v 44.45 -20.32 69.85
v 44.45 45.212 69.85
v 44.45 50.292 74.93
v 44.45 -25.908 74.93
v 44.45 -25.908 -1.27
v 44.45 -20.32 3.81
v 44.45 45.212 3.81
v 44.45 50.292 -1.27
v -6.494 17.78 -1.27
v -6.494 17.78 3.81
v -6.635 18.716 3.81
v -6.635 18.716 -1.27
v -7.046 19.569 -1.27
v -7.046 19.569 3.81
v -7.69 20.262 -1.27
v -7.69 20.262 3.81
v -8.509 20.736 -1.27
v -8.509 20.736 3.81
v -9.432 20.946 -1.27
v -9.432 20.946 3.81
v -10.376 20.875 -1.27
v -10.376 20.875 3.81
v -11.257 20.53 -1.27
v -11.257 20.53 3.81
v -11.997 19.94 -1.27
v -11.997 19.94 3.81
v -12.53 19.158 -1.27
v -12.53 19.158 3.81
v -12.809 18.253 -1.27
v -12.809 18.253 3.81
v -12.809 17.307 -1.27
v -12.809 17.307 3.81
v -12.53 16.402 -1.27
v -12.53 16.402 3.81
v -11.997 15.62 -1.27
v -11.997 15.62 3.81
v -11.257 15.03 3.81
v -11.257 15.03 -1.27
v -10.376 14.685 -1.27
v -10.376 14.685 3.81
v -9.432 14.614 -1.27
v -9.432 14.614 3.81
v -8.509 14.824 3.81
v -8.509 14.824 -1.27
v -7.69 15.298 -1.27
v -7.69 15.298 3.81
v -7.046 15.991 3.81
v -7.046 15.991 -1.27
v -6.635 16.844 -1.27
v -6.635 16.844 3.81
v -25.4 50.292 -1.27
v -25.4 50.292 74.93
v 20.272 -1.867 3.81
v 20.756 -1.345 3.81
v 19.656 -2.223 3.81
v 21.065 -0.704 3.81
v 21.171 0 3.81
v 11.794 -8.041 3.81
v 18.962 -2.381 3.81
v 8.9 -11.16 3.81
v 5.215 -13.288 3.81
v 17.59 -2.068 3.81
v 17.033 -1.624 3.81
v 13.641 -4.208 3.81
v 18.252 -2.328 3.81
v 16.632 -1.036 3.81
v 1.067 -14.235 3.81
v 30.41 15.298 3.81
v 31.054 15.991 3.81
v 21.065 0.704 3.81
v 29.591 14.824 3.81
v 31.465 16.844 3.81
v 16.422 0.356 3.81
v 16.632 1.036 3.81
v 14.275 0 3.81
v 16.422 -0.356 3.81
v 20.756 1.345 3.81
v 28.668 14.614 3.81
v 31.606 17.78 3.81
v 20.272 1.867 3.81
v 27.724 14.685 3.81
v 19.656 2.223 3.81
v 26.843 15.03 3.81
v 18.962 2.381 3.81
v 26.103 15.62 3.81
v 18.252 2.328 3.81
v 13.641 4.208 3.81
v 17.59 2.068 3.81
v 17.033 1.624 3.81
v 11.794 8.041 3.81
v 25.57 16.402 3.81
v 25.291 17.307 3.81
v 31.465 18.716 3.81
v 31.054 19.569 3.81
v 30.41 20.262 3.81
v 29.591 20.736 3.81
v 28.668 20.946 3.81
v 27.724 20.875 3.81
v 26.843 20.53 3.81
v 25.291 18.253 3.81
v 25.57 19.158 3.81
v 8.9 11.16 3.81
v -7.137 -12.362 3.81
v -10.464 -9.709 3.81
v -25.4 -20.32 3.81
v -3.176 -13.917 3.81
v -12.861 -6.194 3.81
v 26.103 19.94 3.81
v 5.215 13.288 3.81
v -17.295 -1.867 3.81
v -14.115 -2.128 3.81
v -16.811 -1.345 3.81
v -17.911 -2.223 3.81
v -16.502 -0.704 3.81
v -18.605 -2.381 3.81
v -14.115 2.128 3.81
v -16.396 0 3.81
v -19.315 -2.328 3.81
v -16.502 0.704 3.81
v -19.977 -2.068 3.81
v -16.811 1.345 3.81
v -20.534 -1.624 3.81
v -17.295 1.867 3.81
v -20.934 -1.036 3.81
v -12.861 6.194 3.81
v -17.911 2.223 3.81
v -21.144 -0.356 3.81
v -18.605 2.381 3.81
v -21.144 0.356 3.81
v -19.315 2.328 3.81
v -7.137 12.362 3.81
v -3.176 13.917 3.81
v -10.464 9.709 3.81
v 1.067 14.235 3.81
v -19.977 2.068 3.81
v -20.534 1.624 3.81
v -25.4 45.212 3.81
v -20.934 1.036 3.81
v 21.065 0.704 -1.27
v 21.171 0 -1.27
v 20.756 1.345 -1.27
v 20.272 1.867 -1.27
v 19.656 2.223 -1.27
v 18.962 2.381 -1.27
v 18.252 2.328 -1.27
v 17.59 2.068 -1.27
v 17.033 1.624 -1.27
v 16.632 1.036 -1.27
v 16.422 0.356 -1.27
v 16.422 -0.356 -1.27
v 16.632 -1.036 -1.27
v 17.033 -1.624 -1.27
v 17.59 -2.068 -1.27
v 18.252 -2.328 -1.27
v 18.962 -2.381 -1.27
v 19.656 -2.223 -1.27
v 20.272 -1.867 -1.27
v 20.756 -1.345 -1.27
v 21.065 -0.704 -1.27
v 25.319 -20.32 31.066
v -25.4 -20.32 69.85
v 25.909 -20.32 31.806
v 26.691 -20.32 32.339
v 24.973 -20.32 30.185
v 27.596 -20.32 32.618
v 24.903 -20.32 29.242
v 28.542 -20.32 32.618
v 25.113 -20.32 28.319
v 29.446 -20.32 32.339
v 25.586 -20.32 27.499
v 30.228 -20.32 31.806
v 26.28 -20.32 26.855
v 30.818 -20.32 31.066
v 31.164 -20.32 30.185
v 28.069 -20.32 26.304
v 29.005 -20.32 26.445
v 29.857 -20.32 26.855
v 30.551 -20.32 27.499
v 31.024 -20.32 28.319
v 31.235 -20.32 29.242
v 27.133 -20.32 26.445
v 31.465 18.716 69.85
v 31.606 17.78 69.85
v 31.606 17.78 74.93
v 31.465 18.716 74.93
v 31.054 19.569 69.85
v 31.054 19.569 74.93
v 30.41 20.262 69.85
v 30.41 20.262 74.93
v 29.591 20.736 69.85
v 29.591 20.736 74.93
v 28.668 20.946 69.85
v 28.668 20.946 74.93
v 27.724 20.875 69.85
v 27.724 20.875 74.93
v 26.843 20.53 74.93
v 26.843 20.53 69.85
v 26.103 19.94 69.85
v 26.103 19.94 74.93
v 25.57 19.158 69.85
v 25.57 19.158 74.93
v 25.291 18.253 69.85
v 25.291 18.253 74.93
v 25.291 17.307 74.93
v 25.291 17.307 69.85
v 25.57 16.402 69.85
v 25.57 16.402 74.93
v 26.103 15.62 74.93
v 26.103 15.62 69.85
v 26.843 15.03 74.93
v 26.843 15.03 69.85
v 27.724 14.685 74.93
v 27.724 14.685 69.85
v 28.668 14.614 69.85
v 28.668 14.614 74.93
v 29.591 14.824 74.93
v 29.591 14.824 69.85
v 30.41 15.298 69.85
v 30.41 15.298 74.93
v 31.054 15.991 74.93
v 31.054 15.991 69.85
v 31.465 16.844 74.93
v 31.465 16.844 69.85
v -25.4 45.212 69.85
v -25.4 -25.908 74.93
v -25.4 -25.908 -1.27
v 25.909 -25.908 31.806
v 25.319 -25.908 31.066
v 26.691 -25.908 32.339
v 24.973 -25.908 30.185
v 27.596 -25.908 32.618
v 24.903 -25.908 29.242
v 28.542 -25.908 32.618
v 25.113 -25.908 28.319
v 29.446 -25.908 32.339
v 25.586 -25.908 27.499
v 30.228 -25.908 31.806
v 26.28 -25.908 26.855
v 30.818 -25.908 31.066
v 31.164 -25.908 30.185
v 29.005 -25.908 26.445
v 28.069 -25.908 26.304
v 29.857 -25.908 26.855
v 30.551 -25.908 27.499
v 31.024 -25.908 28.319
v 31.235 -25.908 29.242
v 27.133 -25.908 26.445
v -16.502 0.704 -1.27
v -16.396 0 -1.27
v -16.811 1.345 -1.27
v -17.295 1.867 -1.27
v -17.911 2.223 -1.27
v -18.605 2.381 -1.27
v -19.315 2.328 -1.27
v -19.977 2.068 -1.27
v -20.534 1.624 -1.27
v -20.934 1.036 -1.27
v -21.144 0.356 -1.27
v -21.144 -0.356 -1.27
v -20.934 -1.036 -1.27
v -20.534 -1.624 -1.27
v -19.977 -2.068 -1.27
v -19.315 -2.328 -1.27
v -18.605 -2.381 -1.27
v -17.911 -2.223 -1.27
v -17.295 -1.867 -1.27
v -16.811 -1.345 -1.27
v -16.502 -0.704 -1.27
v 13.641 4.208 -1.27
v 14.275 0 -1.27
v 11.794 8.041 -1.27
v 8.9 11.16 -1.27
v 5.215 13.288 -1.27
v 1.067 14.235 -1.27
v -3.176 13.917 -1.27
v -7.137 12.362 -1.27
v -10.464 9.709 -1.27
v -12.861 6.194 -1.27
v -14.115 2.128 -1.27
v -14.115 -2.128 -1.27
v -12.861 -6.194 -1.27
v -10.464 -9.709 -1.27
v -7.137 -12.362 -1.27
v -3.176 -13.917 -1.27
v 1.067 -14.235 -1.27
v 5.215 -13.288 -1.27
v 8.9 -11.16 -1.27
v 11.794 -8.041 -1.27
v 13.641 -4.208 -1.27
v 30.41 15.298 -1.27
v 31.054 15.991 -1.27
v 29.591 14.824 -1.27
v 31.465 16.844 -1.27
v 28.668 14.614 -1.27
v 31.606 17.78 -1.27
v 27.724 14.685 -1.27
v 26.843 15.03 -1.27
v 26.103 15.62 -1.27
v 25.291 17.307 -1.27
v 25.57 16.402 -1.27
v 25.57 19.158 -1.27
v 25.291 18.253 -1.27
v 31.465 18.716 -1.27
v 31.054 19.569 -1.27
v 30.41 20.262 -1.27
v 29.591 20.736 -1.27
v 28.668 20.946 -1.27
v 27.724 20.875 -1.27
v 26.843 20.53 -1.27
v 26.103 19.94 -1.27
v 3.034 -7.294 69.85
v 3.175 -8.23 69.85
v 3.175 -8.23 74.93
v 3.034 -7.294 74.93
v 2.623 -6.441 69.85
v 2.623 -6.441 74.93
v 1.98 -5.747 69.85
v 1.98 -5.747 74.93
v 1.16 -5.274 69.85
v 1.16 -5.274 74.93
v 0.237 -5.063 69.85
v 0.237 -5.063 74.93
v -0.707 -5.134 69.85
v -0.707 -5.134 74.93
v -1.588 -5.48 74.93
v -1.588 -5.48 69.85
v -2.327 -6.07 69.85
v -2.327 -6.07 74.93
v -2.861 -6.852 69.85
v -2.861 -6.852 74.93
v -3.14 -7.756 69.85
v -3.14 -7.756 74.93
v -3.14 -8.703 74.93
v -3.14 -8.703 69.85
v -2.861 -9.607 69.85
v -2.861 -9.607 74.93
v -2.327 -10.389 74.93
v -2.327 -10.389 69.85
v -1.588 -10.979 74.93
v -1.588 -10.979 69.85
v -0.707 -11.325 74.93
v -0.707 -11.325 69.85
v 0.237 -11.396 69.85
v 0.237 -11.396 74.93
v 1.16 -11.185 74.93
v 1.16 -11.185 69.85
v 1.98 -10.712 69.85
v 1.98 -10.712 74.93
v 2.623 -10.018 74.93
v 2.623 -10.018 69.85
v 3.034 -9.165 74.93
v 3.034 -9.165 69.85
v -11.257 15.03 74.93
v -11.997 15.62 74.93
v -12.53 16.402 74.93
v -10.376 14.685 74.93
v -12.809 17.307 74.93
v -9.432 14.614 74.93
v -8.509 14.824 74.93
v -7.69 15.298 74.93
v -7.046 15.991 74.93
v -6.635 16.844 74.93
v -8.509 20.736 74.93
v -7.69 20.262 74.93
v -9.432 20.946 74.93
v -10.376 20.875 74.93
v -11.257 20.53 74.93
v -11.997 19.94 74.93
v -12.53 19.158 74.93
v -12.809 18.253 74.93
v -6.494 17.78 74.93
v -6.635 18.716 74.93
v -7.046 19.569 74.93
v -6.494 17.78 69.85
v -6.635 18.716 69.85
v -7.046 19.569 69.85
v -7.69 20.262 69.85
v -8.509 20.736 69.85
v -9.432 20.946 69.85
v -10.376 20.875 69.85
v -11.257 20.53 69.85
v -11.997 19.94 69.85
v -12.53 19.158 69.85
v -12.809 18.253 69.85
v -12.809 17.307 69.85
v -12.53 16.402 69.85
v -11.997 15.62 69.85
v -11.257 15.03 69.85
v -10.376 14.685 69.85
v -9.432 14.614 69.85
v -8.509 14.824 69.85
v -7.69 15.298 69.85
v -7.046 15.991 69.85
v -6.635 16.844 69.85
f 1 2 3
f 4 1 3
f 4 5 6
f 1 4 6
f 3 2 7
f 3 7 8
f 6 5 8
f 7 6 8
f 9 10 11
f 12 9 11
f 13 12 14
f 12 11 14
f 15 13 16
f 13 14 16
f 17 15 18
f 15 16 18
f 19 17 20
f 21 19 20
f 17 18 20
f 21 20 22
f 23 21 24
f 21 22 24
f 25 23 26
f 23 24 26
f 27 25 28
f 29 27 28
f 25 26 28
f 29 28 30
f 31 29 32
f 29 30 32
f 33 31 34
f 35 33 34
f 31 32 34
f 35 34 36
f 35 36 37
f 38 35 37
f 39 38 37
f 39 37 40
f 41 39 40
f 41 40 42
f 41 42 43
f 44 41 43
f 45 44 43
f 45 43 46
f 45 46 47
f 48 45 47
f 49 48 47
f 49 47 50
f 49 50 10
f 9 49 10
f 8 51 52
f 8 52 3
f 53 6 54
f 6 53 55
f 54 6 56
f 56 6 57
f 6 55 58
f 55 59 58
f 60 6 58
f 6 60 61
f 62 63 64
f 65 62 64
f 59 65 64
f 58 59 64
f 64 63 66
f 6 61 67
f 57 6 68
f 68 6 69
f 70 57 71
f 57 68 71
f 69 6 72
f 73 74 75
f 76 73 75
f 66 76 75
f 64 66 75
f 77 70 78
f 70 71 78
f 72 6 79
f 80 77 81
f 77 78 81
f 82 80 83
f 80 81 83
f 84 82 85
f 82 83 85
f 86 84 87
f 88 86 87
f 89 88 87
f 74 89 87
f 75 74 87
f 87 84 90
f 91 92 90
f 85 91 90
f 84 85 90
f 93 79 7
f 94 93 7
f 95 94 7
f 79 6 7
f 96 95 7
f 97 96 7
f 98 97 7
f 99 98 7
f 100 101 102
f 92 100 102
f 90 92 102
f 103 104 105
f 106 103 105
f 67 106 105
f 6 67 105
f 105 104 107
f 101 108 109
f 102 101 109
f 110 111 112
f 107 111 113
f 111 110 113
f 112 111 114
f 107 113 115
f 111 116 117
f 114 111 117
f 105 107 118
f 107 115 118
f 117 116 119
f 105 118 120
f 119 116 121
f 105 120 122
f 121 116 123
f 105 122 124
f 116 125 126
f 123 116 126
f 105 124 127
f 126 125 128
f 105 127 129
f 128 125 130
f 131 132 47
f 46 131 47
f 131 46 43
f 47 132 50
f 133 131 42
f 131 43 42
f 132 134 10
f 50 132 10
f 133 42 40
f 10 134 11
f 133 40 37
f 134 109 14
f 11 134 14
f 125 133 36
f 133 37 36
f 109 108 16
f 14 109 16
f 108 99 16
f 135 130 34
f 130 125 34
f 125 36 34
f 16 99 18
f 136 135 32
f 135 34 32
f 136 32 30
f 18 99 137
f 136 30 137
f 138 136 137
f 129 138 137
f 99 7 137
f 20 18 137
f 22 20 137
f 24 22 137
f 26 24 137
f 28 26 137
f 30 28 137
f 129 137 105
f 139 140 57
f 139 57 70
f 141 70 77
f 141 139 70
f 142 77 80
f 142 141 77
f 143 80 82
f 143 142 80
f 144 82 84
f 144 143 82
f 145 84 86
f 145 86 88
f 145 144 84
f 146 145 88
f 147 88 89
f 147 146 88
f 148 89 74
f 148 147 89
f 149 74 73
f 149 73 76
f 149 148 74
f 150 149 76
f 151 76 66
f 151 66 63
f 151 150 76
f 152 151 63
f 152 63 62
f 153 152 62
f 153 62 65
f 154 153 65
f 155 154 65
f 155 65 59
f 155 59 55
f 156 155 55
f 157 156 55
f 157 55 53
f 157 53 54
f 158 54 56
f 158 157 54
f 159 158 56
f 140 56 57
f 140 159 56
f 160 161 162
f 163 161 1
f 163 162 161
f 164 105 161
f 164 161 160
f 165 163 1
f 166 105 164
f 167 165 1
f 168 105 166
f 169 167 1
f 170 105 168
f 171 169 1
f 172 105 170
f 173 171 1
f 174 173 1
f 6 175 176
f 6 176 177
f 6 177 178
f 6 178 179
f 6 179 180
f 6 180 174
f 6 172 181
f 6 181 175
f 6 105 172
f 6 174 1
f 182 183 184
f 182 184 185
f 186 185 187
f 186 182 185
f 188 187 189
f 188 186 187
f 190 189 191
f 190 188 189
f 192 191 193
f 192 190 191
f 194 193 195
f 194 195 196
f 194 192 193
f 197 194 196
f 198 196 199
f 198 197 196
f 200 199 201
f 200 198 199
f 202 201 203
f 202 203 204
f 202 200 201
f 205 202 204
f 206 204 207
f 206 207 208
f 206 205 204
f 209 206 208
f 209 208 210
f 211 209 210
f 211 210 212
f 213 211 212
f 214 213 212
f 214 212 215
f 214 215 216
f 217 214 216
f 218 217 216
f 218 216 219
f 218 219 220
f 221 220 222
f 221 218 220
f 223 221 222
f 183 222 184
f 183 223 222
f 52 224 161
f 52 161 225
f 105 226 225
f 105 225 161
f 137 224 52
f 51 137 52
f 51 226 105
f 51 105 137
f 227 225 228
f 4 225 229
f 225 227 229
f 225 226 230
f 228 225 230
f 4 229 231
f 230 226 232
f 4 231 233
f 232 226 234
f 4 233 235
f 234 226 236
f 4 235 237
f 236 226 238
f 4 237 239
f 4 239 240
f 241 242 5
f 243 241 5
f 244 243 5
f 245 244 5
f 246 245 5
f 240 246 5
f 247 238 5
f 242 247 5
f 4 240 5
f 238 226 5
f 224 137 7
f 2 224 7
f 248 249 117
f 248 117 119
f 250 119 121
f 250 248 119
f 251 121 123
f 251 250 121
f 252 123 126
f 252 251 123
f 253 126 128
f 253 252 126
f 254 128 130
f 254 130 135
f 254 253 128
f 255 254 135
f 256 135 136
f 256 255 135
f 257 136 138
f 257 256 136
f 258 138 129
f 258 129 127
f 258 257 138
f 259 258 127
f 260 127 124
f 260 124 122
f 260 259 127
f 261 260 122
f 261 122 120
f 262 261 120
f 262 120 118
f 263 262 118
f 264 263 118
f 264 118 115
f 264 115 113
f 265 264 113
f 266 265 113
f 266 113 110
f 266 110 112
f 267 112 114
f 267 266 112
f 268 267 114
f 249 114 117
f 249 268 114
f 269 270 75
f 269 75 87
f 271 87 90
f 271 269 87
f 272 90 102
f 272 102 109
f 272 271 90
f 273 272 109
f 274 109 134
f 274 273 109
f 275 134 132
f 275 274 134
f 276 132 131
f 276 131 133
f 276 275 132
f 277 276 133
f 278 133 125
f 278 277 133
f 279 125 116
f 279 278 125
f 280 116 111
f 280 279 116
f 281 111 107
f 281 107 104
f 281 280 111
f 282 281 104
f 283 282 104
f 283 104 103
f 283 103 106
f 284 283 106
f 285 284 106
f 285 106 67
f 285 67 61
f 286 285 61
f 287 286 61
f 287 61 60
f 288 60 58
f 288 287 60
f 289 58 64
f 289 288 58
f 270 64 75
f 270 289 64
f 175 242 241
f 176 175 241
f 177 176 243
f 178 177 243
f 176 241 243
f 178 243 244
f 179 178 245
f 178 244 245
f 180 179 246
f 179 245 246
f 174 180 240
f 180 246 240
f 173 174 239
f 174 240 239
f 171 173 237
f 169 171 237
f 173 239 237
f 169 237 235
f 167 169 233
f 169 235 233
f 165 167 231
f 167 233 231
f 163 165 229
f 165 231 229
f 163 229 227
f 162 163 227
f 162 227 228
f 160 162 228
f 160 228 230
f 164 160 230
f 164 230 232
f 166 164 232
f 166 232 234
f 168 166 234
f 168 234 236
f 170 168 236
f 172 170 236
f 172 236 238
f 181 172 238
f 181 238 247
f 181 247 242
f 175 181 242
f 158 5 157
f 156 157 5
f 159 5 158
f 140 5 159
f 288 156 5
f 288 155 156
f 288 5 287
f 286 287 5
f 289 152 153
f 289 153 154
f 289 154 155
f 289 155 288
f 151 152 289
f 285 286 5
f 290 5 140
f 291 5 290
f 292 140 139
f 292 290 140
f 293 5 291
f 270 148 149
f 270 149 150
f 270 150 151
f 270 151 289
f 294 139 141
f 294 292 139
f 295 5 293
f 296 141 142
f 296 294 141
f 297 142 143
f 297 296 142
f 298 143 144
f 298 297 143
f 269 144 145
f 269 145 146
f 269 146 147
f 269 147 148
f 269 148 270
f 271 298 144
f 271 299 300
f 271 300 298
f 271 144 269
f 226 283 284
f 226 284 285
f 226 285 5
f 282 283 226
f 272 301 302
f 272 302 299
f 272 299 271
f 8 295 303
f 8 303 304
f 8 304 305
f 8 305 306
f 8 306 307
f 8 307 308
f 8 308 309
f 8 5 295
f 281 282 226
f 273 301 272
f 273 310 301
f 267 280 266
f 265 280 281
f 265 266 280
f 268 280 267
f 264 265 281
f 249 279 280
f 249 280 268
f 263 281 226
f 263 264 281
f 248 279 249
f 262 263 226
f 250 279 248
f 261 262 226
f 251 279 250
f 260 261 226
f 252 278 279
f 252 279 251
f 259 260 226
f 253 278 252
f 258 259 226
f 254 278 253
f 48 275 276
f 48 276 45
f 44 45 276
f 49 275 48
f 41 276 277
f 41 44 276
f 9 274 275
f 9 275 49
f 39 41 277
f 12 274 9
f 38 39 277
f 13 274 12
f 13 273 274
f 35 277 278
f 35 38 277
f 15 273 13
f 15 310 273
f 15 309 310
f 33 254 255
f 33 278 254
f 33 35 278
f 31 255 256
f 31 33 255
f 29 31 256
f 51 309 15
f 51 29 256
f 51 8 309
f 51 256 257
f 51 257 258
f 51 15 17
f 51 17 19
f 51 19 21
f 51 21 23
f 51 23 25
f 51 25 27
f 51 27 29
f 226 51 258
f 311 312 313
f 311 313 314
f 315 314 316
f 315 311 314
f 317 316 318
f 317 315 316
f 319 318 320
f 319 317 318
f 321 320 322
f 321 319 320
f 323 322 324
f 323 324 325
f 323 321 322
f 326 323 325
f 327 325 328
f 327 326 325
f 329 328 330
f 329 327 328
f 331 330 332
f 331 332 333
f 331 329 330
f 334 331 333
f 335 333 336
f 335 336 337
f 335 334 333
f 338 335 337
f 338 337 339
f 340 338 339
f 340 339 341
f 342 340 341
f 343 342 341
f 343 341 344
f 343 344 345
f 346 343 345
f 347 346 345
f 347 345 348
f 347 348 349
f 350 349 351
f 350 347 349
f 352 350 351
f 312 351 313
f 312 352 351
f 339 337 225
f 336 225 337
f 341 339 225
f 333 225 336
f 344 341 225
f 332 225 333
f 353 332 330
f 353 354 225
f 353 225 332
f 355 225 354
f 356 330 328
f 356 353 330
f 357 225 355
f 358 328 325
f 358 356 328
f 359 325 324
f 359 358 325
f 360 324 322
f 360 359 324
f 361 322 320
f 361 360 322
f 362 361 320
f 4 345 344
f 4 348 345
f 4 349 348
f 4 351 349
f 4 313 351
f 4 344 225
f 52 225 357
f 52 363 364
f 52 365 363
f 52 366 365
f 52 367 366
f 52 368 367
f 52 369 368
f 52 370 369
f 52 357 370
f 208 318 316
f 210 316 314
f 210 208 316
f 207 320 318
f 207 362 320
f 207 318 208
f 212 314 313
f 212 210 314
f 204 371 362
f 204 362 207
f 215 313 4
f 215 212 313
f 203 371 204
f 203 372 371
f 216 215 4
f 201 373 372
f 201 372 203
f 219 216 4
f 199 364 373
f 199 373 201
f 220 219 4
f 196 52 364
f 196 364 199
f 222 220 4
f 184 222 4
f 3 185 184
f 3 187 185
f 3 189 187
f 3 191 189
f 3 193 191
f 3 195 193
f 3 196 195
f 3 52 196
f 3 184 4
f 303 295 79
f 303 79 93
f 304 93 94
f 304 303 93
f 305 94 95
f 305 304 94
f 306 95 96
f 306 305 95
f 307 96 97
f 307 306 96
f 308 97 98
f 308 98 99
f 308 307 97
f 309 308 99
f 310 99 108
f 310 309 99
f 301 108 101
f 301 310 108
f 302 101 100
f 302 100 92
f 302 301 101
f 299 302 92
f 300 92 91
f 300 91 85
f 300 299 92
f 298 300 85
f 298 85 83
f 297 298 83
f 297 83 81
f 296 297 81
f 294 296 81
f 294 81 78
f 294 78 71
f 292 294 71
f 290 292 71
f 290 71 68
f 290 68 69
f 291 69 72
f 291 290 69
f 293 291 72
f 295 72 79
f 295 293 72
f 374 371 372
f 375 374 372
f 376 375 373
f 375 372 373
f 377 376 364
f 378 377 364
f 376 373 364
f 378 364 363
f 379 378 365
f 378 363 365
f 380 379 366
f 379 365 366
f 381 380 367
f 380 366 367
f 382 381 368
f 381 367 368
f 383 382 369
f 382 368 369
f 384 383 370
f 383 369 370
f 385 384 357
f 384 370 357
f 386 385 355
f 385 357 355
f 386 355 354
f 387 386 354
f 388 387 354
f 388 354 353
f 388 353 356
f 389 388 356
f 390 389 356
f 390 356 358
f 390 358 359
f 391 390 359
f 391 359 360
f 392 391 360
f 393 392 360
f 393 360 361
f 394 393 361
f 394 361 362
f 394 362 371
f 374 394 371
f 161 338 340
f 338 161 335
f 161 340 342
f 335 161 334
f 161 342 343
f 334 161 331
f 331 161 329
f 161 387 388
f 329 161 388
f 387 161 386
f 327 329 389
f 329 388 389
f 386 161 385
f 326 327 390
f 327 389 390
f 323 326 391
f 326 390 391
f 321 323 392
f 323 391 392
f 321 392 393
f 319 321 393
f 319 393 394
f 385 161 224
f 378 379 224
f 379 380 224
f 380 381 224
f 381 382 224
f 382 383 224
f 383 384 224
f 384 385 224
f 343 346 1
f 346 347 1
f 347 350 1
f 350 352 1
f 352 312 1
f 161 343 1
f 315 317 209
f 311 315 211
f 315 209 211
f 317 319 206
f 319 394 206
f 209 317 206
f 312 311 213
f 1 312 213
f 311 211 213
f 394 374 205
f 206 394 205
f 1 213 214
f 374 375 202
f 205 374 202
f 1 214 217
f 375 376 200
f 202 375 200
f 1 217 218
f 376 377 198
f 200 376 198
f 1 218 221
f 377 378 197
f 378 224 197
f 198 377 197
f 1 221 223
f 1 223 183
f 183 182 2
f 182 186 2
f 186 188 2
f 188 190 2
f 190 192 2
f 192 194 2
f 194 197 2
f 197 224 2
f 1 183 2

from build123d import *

# Parameters (mm, degrees)
BOSS_EXTRUDE1_DEPTH      = 3.81
BOSS_EXTRUDE1_DEPTH_BACK = 1.27
SKETCH1_R                = 14.2748
SKETCH1_R_2              = 2.3876
SKETCH1_R_3              = 3.175
SKETCH2_W                = 69.85
SKETCH2_H                = 5.08
BOSS_EXTRUDE2_DEPTH      = 66.04
SKETCH3_W                = 69.85
SKETCH3_H                = 5.588
BOSS_EXTRUDE3_DEPTH      = 66.04
SKETCH4_W                = 69.85
SKETCH4_H                = 76.2
SKETCH4_R                = 3.175
BOSS_EXTRUDE4_DEPTH      = 5.08
CUT_EXTRUDE1_REACH       = 117.744
SKETCH6_R                = 3.174999999
SKETCH8_R                = 3.175
CUT_EXTRUDE2_DEPTH       = 102.545692986


with BuildPart() as part:
    # Sketch1 → Boss-Extrude1 (new, two sides: drawn at the far end of the back side and taken through both)
    with BuildSketch(Plane.XY.offset(-BOSS_EXTRUDE1_DEPTH_BACK)):
        Polygon((-25.4, 43.942), (-25.4, 50.292), (44.45, 50.292), (44.45, 24.892), (44.45, -25.908), (-25.4, -25.908), align=None)
        Circle(SKETCH1_R, mode=Mode.SUBTRACT)
        with Locations((18.7833, 0)):
            Circle(SKETCH1_R_2, mode=Mode.SUBTRACT)
        with Locations((-18.7833, 0)):
            Circle(SKETCH1_R_2, mode=Mode.SUBTRACT)
        with Locations((28.430863033, 17.78)):
            Circle(SKETCH1_R_3, mode=Mode.SUBTRACT)
    extrude(amount=BOSS_EXTRUDE1_DEPTH + BOSS_EXTRUDE1_DEPTH_BACK)

    # Sketch2 → Boss-Extrude2 (add)
    with BuildSketch(Plane.XY.offset(3.81)):
        with Locations((9.525, 47.752)):
            Rectangle(SKETCH2_W, SKETCH2_H)
    extrude(amount=BOSS_EXTRUDE2_DEPTH)

    # Sketch3 → Boss-Extrude3 (add)
    with BuildSketch(Plane.XY.offset(3.81)):
        with Locations((9.525, -23.114)):
            Rectangle(SKETCH3_W, SKETCH3_H)
    extrude(amount=BOSS_EXTRUDE3_DEPTH)

    # Sketch4 → Boss-Extrude4 (add)
    with BuildSketch(Plane.XY.offset(69.85)):
        with Locations((9.525, 12.192)):
            Rectangle(SKETCH4_W, SKETCH4_H)
        with Locations((28.430863033, 17.78)):
            Circle(SKETCH4_R, mode=Mode.SUBTRACT)
        with Locations((0, -8.2296)):
            Circle(SKETCH4_R, mode=Mode.SUBTRACT)
    extrude(amount=BOSS_EXTRUDE4_DEPTH)

    # Sketch6 → Cut-Extrude1 (cut, up to next)
    with BuildSketch(Plane.XZ.offset(25.908), mode=Mode.PRIVATE) as cut_extrude1_sk1:
        with Locations(Location((28.068770575, 29.478784222, 0), (0, 0, 270))):
            Circle(SKETCH6_R)
    cut_extrude1_tool1 = extrude(cut_extrude1_sk1.sketch, amount=-CUT_EXTRUDE1_REACH, mode=Mode.PRIVATE) & part.part
    add(cut_extrude1_tool1.solids().sort_by_distance((28.068771, -25.908, 29.478784))[0], mode=Mode.SUBTRACT)

    # Sketch8 → Cut-Extrude2 (cut, through all)
    with BuildSketch(Plane.XY.offset(74.93)):
        with Locations((-9.669136967, 17.78)):
            Circle(SKETCH8_R)
    extrude(amount=-CUT_EXTRUDE2_DEPTH, mode=Mode.SUBTRACT)


solid = part.part
